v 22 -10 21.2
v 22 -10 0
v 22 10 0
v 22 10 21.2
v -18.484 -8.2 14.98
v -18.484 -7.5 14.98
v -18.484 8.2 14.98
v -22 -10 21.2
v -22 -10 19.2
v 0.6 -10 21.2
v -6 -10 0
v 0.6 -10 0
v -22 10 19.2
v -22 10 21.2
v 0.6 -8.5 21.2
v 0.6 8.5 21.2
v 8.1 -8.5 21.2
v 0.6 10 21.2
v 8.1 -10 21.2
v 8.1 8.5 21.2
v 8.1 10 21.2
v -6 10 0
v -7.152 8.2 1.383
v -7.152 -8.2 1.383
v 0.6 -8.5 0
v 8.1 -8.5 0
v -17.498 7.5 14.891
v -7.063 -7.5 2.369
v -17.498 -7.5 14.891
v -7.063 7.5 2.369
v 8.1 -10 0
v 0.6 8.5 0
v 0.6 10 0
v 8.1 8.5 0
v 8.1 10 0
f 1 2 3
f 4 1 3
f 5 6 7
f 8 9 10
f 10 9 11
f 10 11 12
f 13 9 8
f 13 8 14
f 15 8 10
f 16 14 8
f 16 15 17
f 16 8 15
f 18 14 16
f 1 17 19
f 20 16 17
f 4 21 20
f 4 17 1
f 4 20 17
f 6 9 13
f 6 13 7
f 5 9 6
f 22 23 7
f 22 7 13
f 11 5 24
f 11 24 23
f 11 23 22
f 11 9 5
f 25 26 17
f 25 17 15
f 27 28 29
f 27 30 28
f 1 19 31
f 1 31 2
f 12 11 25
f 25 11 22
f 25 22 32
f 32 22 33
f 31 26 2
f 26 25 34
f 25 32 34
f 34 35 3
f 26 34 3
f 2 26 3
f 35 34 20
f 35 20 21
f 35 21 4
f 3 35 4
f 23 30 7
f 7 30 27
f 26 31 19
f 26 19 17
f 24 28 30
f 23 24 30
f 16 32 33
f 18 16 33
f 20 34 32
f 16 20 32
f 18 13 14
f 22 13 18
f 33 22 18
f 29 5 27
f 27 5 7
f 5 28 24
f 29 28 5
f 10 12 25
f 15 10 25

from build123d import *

# Parameters (mm, degrees)
SKETCH1_W               = 44
SKETCH1_H               = 20
BOSS_EXTRUDE1_DEPTH     = 21.2
CUT_EXTRUDE1_DEPTH      = 32.771685508
CUT_EXTRUDE1_DEPTH_BACK = 32.771685508
SKETCH4_W               = 17
SKETCH4_H               = 15
CUT_EXTRUDE3_DEPTH      = 0.7
CHAMFER3_SIZE           = 0.7
CHAMFER4_SIZE           = 0.7
SKETCH5_W               = 7.5
SKETCH5_H               = 1.5
CUT_EXTRUDE4_DEPTH      = 33.147161617


with BuildPart() as part:
    # Sketch1 → Boss-Extrude1 (new body)
    with BuildSketch(Plane.XY):
        Rectangle(SKETCH1_W, SKETCH1_H)
    extrude(amount=BOSS_EXTRUDE1_DEPTH)

    # Sketch2 → Cut-Extrude1 (cut, two sides: drawn at the far end of the back side and taken through both)
    with BuildSketch(Plane(origin=(0, -10, 11.2), x_dir=(1, 0, 0), z_dir=(0, 1, 0)).offset(-CUT_EXTRUDE1_DEPTH_BACK)):
        Polygon((-89.868081564, -89.441697876), (-22, -8), (-6, 11.2), (61.868081564, 92.641697876), (-101.015314189, 228.377861004), (-252.751477317, 46.294465251), align=None)
    extrude(amount=CUT_EXTRUDE1_DEPTH + CUT_EXTRUDE1_DEPTH_BACK, mode=Mode.SUBTRACT)

    # Sketch4 → Cut-Extrude3 (cut)
    with BuildSketch(Plane(origin=(-3.540983607, 0, -2.950819672), x_dir=(-0.6401843996644798, 0, 0.7682212795973761), z_dir=(-0.7682212795973761, 0, -0.6401843996644798))):
        with Locations((14.841106398, 0)):
            Rectangle(SKETCH4_W, SKETCH4_H)
    extrude(amount=-CUT_EXTRUDE3_DEPTH, mode=Mode.SUBTRACT)

    # Chamfer3
    chamfer3_edges = [part.edges().sort_by_distance(p)[0] for p in [
        (-13.042028396, 7.5, 8.450434076),
        (-13.042028396, -7.5, 8.450434076),
        (-7.600460999, 0, 1.920553199),
    ]]
    chamfer(chamfer3_edges, length=CHAMFER3_SIZE - 0.0001)  # a hair under: the kernel refuses the full size

    # Chamfer4
    chamfer4_edges = [part.edges().sort_by_distance(p)[0] for p in [
        (-17.945840898, 0, 15.428444032),
    ]]
    chamfer(chamfer4_edges, length=CHAMFER4_SIZE - 0.0001)  # a hair under: the kernel refuses the full size

    # Sketch5 → Cut-Extrude4 (cut, through all)
    with BuildSketch(Plane(origin=(0, 0, 0), x_dir=(-1, 0, 0), z_dir=(0, 0, -1))):
        with Locations((-4.35, 9.25)):
            Rectangle(SKETCH5_W, SKETCH5_H)
        with Locations((-4.35, -9.25)):
            Rectangle(SKETCH5_W, SKETCH5_H)
    extrude(amount=-CUT_EXTRUDE4_DEPTH, mode=Mode.SUBTRACT)


solid = part.part
